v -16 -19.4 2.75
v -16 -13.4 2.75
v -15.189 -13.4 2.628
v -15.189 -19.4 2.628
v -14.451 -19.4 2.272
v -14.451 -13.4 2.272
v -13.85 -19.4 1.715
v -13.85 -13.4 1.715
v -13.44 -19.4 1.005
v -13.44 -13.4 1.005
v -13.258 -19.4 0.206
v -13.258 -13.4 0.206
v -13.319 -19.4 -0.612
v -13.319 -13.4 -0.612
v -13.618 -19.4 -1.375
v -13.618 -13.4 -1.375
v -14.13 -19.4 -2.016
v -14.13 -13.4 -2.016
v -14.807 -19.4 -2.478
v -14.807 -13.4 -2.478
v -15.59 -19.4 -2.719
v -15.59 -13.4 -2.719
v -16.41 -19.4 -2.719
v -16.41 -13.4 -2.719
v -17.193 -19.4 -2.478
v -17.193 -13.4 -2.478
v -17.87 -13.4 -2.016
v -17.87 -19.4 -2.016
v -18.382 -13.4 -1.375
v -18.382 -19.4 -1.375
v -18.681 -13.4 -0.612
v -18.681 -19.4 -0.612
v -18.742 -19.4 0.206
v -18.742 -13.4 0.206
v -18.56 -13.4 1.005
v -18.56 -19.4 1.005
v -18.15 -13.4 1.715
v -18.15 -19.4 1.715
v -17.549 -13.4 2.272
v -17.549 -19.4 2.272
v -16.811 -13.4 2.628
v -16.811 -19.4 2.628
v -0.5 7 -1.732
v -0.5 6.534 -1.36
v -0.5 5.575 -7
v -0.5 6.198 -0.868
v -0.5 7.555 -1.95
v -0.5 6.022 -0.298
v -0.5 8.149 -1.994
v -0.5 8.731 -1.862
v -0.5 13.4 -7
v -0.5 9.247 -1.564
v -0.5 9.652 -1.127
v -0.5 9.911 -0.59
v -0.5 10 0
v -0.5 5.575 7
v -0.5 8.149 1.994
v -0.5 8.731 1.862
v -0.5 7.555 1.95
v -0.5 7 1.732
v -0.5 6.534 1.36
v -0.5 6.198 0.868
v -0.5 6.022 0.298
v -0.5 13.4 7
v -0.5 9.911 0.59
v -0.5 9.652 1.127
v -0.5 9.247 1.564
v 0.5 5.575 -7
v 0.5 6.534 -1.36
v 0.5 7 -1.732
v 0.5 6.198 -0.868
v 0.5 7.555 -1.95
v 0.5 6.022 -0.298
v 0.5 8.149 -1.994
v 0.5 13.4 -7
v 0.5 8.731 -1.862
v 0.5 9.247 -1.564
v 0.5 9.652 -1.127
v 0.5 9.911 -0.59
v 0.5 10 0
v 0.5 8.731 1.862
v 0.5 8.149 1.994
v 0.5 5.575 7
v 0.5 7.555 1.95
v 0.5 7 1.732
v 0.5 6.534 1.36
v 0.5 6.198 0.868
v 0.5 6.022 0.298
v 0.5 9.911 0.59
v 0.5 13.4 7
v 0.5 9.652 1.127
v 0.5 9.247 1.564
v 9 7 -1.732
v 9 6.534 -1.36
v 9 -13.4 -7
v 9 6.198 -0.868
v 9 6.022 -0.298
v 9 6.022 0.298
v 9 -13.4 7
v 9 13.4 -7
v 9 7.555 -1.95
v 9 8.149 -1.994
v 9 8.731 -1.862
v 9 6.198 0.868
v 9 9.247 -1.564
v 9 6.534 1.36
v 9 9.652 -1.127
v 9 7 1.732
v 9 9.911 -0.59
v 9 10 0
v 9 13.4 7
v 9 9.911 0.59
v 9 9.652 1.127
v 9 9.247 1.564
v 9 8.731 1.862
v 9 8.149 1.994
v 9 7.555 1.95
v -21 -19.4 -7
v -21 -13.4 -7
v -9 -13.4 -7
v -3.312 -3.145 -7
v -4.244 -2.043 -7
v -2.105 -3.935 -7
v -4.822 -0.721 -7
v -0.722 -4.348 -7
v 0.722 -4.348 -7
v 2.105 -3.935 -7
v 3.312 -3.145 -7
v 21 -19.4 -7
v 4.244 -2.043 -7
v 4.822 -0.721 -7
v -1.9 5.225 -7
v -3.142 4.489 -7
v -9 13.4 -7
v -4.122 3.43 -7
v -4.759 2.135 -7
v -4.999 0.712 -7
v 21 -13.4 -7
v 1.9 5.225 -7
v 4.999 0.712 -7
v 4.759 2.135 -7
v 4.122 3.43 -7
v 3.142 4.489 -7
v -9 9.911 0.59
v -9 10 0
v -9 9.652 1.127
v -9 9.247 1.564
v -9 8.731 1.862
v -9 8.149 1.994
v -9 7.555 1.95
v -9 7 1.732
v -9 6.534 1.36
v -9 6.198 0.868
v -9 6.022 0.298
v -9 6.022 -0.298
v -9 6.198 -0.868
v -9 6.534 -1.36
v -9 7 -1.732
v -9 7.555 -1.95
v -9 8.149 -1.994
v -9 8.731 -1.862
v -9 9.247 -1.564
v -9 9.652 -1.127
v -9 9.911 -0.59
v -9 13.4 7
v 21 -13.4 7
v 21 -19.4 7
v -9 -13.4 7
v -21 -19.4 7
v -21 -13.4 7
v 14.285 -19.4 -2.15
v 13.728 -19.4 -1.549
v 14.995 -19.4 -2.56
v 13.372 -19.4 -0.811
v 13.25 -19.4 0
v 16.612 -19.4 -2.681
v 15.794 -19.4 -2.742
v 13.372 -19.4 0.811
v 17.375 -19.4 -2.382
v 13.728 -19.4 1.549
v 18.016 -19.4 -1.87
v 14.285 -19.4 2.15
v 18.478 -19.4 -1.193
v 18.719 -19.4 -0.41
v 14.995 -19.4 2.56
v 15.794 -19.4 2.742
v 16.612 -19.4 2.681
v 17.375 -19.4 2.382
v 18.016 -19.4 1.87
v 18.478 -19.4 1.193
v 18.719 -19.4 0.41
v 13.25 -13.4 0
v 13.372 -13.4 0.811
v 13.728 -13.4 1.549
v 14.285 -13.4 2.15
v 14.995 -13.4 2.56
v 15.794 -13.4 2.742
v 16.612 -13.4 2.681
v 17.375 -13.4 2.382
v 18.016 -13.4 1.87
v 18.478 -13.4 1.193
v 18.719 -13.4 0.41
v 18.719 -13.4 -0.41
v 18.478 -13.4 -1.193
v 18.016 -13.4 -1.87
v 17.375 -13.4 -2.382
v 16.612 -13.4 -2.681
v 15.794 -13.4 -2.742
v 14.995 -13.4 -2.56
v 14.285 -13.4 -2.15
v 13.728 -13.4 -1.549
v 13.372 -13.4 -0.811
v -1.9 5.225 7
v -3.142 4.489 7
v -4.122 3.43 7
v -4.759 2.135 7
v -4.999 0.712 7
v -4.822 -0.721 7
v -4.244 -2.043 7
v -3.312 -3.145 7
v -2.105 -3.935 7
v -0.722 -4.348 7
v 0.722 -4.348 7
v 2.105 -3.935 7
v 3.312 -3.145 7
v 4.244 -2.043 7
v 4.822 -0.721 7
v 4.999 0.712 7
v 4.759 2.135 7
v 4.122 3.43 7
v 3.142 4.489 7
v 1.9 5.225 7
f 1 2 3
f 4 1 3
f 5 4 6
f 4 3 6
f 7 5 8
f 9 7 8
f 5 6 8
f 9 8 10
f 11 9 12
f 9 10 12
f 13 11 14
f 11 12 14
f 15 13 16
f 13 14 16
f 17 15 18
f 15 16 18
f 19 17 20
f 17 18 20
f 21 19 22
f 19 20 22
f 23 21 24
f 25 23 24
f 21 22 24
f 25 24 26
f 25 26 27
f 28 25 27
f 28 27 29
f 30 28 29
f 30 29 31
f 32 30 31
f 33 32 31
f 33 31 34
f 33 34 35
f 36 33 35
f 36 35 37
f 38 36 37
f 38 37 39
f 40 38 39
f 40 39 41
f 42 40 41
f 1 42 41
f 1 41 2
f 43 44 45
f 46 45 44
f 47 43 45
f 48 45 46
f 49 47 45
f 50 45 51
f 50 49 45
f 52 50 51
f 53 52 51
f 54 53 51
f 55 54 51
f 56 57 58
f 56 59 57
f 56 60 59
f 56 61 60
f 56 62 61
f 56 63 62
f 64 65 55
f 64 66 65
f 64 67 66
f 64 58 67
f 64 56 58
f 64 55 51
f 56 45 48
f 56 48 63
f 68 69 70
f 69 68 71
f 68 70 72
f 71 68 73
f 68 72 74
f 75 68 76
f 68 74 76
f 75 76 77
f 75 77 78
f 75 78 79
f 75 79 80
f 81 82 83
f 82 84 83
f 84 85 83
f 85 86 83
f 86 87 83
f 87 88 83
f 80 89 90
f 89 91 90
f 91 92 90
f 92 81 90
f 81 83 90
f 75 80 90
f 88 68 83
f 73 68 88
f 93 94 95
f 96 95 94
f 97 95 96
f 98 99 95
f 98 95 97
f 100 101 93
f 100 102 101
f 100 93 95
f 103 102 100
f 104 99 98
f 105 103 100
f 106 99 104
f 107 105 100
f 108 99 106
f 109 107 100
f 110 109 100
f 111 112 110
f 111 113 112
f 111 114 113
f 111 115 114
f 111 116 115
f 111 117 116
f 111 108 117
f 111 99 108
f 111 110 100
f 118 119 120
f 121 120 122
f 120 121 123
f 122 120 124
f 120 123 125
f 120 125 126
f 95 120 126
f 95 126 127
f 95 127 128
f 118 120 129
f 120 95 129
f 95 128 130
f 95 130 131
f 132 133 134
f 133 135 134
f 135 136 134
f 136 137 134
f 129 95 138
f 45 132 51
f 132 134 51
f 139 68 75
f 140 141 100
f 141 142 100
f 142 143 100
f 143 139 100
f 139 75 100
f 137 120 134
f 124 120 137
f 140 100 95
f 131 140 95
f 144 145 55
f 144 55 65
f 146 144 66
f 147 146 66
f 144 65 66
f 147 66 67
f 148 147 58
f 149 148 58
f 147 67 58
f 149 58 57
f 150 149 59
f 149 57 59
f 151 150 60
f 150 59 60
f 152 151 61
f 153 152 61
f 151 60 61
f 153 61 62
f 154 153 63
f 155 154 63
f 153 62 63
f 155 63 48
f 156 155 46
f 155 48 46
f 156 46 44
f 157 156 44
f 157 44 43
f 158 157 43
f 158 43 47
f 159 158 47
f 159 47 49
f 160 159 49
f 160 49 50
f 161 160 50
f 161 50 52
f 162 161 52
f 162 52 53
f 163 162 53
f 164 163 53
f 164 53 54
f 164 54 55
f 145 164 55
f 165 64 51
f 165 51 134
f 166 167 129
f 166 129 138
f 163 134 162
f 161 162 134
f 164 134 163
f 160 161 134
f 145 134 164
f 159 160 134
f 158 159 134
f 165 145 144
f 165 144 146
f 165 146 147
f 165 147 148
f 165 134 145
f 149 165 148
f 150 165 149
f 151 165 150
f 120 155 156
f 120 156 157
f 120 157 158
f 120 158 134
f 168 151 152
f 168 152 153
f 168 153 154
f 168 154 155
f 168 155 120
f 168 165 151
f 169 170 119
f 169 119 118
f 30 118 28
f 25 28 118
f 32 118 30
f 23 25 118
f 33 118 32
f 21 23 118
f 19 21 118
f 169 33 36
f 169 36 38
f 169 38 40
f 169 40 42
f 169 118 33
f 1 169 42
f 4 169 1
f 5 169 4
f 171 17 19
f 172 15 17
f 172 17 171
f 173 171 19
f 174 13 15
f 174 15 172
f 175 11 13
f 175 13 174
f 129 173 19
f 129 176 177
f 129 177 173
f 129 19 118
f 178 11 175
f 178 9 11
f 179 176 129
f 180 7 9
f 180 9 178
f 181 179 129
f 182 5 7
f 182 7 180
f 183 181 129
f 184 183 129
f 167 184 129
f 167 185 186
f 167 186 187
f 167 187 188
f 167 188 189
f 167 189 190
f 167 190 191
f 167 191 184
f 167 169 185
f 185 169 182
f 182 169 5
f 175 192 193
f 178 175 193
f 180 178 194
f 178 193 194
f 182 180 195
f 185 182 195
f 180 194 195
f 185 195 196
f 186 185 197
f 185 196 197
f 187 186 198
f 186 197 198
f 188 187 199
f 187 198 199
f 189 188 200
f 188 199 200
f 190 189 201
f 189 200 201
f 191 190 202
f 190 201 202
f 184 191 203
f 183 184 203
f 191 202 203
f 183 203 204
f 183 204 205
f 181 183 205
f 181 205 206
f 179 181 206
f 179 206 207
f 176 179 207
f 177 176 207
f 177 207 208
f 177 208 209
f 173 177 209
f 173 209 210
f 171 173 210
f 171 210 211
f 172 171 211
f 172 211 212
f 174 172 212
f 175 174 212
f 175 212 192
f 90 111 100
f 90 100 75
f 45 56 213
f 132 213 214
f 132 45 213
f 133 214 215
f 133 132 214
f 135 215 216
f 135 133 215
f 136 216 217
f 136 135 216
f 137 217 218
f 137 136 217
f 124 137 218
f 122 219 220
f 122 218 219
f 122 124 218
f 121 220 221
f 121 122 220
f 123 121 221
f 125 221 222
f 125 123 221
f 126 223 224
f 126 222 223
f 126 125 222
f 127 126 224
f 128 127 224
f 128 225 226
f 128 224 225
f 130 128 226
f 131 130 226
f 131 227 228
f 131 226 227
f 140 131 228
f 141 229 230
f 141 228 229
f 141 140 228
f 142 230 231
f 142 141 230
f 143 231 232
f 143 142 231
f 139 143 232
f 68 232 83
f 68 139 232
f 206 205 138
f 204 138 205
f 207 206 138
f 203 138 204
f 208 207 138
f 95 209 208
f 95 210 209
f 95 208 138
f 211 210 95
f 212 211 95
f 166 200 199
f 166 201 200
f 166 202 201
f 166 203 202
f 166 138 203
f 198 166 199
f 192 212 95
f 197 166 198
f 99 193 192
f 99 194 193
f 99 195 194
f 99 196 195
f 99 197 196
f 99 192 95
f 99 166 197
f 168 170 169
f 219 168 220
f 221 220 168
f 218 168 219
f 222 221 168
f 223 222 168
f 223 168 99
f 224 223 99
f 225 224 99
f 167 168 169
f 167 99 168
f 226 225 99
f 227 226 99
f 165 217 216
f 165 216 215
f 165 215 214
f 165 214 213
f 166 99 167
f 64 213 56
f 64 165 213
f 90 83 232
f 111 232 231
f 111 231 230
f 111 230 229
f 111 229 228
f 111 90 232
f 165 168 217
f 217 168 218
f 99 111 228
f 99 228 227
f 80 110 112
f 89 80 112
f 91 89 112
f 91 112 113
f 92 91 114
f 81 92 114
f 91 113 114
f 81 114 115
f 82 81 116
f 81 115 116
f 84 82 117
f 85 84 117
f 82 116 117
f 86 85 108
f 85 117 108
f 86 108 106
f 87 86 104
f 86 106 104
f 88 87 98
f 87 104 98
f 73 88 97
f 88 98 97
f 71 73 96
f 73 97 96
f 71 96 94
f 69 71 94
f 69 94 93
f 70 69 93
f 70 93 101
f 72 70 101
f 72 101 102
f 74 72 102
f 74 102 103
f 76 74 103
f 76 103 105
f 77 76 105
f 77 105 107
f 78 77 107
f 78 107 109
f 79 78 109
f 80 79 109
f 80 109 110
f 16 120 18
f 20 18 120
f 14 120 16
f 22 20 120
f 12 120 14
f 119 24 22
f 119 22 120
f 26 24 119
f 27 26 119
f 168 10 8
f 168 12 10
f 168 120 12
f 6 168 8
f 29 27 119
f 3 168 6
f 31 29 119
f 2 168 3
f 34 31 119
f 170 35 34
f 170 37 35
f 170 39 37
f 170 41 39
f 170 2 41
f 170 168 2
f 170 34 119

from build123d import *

# Parameters (mm, degrees)
SKETCH_3_R          = 5
EXTRUDE_3_DEPTH     = 7
SKETCH_5_R          = 2.75
CUT_EXTRUDE_1_DEPTH = 10
SKETCH_6_W          = 1
SKETCH_6_H          = 13.139857665
CUT_EXTRUDE_2_DEPTH = 14
SKETCH_7_R          = 2
CUT_EXTRUDE_3_DEPTH = 37.405494091


with BuildPart() as part:
    # 草图3 → 凸台-拉伸3 (new, symmetric)
    with BuildSketch(Plane.XY):
        Polygon((-9, -13.4), (-21, -13.4), (-21, -19.4), (21, -19.4), (21, -13.4), (9, -13.4), (9, 13.4), (-9, 13.4), align=None)
        with Locations((0, 0.6)):
            Circle(SKETCH_3_R, mode=Mode.SUBTRACT)
    extrude(amount=EXTRUDE_3_DEPTH, both=True)

    # 草图5 → 切除-拉伸1 (cut)
    with BuildSketch(Plane(origin=(0, -13.4, 0), x_dir=(1, 0, 0), z_dir=(0, 1, 0))):
        with Locations(Location((-16, 0, 0), (0, 0, 270))):
            Circle(SKETCH_5_R)
        with Locations(Location((16, 0, 0), (0, 0, 180))):
            Circle(SKETCH_5_R)
    extrude(amount=-CUT_EXTRUDE_1_DEPTH, mode=Mode.SUBTRACT)

    # 草图6 → 切除-拉伸2 (cut)
    with BuildSketch(Plane.XY.offset(7)):
        with Locations((0, 10.029998353)):
            Rectangle(SKETCH_6_W, SKETCH_6_H)
    extrude(amount=-CUT_EXTRUDE_2_DEPTH, mode=Mode.SUBTRACT)

    # 草图7 → 切除-拉伸3 (cut, through all)
    with BuildSketch(Plane(origin=(9, 0, 0), x_dir=(0, 0, -1), z_dir=(1, 0, 0))):
        with Locations(Location((0, 8, 0), (0, 0, 90))):
            Circle(SKETCH_7_R)
    extrude(amount=-CUT_EXTRUDE_3_DEPTH, mode=Mode.SUBTRACT)


solid = part.part
